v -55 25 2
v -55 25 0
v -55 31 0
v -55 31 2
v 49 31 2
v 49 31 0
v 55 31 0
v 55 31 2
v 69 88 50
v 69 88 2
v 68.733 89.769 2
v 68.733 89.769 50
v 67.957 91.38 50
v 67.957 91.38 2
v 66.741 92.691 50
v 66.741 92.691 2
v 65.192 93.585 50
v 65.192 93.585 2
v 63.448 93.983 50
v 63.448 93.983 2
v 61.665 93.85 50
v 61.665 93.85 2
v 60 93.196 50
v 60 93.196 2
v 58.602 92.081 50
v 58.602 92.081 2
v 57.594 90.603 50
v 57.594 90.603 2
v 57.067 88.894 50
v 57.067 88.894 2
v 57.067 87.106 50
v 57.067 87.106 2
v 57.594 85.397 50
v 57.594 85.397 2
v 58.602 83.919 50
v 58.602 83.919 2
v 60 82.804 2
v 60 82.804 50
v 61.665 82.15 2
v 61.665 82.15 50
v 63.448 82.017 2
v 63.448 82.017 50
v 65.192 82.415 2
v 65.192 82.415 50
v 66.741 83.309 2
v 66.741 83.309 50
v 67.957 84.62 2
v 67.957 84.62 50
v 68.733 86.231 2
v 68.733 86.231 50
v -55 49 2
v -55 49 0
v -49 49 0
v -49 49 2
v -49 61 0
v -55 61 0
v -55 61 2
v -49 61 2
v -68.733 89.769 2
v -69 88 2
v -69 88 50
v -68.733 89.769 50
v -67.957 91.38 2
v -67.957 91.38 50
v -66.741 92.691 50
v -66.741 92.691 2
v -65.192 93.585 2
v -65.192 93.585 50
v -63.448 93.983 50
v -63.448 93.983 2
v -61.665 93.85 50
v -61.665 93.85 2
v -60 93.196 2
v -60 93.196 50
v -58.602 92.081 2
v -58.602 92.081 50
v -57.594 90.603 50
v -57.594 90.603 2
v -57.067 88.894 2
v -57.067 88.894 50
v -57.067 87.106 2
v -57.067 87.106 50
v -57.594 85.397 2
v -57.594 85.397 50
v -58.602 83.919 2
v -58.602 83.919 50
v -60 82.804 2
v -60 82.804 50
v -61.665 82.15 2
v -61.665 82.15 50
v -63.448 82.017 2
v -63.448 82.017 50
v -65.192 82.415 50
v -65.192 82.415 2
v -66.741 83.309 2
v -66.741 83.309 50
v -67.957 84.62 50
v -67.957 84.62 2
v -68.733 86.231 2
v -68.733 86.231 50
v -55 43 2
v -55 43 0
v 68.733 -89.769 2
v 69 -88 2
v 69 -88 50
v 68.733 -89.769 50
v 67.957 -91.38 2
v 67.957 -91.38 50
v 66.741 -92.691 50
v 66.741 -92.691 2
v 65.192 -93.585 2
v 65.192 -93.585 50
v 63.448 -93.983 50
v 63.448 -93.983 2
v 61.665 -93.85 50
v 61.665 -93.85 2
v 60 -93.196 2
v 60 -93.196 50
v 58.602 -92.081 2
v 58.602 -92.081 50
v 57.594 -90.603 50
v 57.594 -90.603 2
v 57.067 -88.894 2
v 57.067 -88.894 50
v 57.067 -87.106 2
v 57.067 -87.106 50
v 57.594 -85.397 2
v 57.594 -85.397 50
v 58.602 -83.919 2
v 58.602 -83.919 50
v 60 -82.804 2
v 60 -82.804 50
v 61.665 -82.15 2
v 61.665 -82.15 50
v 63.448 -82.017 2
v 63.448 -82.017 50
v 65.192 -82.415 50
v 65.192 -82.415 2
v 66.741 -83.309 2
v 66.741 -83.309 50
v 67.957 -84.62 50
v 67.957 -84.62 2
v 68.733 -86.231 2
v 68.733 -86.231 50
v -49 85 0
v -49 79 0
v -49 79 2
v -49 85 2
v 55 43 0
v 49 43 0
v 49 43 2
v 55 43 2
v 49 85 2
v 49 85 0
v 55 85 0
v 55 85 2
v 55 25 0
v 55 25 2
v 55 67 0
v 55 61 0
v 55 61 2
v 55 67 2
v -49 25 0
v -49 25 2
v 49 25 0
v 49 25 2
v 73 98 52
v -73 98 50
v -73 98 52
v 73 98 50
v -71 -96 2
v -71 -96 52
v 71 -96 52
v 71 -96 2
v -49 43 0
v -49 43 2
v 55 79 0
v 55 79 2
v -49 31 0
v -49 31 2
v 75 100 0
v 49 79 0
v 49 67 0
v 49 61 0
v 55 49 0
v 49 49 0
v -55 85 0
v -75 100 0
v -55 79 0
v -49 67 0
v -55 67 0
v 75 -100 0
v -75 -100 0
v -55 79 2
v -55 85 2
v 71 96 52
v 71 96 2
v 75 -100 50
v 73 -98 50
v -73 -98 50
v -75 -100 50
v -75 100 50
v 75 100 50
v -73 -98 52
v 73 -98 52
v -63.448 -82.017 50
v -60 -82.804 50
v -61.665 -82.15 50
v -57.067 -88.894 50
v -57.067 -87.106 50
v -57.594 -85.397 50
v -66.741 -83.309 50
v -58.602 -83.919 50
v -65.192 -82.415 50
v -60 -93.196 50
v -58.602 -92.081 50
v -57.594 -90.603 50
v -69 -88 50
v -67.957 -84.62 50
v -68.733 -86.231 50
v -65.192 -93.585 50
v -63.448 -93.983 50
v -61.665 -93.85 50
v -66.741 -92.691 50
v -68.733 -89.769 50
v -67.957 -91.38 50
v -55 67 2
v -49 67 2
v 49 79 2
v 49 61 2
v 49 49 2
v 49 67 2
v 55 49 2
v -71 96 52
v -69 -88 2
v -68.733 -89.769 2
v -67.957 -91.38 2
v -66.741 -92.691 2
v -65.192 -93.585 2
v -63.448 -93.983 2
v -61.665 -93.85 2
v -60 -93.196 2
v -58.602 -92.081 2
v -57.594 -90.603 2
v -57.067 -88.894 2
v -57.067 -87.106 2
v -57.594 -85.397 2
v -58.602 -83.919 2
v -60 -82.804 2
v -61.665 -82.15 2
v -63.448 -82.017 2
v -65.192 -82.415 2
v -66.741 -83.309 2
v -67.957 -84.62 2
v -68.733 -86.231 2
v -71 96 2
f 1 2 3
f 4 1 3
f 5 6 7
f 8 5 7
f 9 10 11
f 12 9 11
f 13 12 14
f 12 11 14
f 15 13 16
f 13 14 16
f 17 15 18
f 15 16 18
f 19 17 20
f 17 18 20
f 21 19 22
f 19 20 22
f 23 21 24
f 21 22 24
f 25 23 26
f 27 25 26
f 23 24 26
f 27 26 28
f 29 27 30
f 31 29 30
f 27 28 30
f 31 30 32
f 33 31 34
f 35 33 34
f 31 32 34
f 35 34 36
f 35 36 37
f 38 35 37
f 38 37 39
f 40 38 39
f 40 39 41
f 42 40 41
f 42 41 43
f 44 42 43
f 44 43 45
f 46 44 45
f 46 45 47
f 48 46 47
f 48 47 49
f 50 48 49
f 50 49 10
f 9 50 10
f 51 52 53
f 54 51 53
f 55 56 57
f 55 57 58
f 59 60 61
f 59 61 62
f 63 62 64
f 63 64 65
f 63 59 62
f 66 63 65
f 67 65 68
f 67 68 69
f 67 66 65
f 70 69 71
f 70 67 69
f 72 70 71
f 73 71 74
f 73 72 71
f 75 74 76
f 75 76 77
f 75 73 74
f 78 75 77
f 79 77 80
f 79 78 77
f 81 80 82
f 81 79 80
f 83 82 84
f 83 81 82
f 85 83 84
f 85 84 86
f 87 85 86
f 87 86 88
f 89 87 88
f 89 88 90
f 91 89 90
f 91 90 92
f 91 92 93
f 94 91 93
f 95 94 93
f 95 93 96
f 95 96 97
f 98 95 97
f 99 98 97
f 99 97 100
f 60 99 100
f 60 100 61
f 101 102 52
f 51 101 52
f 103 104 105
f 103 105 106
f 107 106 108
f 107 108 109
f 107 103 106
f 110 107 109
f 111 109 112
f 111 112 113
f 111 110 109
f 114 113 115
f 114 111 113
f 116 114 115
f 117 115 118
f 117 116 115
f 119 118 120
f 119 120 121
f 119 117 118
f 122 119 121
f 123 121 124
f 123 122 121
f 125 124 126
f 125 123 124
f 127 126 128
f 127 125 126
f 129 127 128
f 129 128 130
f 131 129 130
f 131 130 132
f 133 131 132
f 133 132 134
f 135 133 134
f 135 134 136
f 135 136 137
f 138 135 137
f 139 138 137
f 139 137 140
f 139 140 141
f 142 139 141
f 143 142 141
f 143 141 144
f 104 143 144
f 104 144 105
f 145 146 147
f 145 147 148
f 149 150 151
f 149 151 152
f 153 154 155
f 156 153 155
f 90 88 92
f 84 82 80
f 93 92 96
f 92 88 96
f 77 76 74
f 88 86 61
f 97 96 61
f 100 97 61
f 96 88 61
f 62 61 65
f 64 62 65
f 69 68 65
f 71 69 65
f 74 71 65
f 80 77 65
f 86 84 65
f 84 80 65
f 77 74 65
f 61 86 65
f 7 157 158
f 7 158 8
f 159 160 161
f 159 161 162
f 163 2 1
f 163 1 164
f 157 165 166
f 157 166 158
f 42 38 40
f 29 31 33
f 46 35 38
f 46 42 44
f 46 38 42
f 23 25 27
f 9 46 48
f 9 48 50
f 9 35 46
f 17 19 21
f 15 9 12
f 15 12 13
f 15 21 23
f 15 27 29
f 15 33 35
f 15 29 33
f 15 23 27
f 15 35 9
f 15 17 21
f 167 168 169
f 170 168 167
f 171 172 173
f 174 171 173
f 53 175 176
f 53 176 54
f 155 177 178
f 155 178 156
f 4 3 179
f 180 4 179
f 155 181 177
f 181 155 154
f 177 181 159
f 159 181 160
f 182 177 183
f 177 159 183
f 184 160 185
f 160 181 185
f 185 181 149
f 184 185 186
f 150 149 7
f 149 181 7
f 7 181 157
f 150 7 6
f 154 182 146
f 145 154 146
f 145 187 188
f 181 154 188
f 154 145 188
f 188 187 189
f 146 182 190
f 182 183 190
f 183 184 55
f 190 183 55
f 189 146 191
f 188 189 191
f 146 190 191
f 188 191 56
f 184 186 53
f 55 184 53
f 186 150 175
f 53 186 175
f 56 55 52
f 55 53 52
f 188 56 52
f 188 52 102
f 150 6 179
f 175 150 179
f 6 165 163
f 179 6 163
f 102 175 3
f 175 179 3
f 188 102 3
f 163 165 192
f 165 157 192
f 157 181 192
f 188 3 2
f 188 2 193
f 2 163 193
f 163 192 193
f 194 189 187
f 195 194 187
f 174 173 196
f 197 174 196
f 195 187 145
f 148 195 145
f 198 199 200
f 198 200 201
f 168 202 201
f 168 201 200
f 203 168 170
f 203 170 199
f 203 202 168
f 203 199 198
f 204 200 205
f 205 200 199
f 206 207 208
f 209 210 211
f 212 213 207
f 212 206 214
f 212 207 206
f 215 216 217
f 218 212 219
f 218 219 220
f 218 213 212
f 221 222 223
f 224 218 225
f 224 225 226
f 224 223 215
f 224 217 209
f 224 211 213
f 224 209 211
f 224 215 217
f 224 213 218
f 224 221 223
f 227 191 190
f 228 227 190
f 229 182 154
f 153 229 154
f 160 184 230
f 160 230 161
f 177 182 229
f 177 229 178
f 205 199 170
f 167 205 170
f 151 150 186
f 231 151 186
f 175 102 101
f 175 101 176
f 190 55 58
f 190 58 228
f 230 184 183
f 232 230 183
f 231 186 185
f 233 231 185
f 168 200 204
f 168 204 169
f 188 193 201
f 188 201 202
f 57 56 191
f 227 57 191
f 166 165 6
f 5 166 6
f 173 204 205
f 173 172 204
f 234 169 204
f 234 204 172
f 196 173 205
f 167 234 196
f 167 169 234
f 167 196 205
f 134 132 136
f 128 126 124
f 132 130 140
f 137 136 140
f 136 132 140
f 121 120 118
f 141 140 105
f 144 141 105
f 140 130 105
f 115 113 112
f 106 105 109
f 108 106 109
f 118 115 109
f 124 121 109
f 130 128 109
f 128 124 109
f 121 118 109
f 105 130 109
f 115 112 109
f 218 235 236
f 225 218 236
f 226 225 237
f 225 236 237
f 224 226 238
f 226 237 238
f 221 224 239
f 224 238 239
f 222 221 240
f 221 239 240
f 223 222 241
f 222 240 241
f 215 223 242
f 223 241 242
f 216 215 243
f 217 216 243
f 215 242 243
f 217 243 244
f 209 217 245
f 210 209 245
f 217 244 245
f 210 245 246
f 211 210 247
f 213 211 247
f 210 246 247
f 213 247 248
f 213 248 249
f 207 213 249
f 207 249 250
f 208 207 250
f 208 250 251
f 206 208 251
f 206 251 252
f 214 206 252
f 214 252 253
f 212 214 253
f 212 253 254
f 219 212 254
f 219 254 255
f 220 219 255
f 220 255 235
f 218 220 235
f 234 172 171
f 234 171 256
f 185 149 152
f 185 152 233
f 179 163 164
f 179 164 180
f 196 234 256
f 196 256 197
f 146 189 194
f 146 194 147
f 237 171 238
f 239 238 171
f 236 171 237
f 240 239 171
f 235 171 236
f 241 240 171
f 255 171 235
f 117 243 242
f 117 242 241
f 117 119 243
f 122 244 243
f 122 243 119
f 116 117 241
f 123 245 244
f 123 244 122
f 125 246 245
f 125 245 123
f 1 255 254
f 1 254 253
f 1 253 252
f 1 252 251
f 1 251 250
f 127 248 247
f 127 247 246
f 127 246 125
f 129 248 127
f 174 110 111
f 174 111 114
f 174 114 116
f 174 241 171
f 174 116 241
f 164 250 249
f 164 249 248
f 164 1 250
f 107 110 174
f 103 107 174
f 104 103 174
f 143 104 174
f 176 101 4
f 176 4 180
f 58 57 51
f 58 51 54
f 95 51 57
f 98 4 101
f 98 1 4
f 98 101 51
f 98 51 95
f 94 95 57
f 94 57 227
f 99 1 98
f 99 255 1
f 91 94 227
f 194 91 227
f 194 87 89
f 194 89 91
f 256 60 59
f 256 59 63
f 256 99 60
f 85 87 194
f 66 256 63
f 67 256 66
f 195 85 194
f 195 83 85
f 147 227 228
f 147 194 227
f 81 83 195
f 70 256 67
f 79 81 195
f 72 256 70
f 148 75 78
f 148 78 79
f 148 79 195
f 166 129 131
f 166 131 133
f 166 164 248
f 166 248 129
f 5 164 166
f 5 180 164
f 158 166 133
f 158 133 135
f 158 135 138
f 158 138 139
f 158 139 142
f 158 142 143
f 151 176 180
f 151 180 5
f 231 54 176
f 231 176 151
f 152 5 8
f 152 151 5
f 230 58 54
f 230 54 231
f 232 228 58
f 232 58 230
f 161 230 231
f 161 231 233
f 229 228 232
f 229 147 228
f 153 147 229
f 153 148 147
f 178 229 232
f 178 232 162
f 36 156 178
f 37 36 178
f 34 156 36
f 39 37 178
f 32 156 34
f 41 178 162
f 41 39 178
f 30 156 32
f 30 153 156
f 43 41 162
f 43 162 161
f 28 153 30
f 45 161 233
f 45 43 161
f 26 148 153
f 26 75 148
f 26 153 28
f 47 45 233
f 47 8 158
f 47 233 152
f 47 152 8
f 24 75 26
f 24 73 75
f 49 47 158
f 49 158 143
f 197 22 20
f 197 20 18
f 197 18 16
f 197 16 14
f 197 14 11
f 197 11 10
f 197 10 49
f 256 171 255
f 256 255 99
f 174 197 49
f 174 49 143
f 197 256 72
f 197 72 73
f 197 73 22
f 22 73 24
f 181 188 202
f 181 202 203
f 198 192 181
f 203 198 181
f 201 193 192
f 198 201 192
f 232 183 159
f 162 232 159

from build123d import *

# Parameters (mm, degrees)
SKETCH_W           = 150
SKETCH_H           = 200
PAD_DEPTH          = 50
SKETCH001_W        = 146
SKETCH001_H        = 196
PAD001_DEPTH       = 52
SKETCH002_W        = 142
SKETCH002_H        = 192
POCKET_DEPTH       = 50
SKETCH003_W        = 6
SKETCH003_H        = 6
POCKET001_DEPTH    = 5
SKETCH004_R        = 6
PAD002_DEPTH       = 50
POLARPATTERN_COUNT = 2


with BuildPart() as part:
    # Sketch → Pad (new body)
    with BuildSketch(Plane.XY):
        Rectangle(SKETCH_W, SKETCH_H)
    extrude(amount=PAD_DEPTH)

    # Sketch001 → Pad001 (join)
    with BuildSketch(Plane.XY):
        Rectangle(SKETCH001_W, SKETCH001_H)
    extrude(amount=PAD001_DEPTH)

    # Sketch002 → Pocket (cut)
    with BuildSketch(Plane.XY.offset(52)):
        Rectangle(SKETCH002_W, SKETCH002_H)
    extrude(amount=-POCKET_DEPTH, mode=Mode.SUBTRACT)

    # Sketch003 → Pocket001 (cut)
    with BuildSketch(Plane.XY):
        with Locations((52, 82)):
            Rectangle(SKETCH003_W, SKETCH003_H)
        with Locations((52, 64)):
            Rectangle(SKETCH003_W, SKETCH003_H)
        with Locations((52, 46)):
            Rectangle(SKETCH003_W, SKETCH003_H)
        with Locations((52, 28)):
            Rectangle(SKETCH003_W, SKETCH003_H)
        with Locations((-52, 82)):
            Rectangle(SKETCH003_W, SKETCH003_H)
        with Locations((-52, 64)):
            Rectangle(SKETCH003_W, SKETCH003_H)
        with Locations((-52, 46)):
            Rectangle(SKETCH003_W, SKETCH003_H)
        with Locations((-52, 28)):
            Rectangle(SKETCH003_W, SKETCH003_H)
    extrude(amount=POCKET001_DEPTH, mode=Mode.SUBTRACT)

    # Sketch004 → Pad002 (join)
    with BuildSketch(Plane.XY):
        with Locations((63, 88)):
            Circle(SKETCH004_R)
    pad002 = extrude(amount=PAD002_DEPTH)

    # Mirrored: Pad002 across Sketch004 V_Axis
    add(pad002.mirror(Plane(origin=(0, 0, 0), x_dir=(0, 0, 1), z_dir=(1, 0, 0))))

    # Mirrored001: Pad002 across Sketch004 H_Axis
    add(pad002.mirror(Plane.ZX))

    # PolarPattern: Pad002 ×2 about axis
    polarpattern_axis = Axis((0, 0, 0), (0, 0, 1))
    for i in range(1, POLARPATTERN_COUNT):
        add(pad002.rotate(polarpattern_axis, i * 360 / POLARPATTERN_COUNT))


solid = part.part
